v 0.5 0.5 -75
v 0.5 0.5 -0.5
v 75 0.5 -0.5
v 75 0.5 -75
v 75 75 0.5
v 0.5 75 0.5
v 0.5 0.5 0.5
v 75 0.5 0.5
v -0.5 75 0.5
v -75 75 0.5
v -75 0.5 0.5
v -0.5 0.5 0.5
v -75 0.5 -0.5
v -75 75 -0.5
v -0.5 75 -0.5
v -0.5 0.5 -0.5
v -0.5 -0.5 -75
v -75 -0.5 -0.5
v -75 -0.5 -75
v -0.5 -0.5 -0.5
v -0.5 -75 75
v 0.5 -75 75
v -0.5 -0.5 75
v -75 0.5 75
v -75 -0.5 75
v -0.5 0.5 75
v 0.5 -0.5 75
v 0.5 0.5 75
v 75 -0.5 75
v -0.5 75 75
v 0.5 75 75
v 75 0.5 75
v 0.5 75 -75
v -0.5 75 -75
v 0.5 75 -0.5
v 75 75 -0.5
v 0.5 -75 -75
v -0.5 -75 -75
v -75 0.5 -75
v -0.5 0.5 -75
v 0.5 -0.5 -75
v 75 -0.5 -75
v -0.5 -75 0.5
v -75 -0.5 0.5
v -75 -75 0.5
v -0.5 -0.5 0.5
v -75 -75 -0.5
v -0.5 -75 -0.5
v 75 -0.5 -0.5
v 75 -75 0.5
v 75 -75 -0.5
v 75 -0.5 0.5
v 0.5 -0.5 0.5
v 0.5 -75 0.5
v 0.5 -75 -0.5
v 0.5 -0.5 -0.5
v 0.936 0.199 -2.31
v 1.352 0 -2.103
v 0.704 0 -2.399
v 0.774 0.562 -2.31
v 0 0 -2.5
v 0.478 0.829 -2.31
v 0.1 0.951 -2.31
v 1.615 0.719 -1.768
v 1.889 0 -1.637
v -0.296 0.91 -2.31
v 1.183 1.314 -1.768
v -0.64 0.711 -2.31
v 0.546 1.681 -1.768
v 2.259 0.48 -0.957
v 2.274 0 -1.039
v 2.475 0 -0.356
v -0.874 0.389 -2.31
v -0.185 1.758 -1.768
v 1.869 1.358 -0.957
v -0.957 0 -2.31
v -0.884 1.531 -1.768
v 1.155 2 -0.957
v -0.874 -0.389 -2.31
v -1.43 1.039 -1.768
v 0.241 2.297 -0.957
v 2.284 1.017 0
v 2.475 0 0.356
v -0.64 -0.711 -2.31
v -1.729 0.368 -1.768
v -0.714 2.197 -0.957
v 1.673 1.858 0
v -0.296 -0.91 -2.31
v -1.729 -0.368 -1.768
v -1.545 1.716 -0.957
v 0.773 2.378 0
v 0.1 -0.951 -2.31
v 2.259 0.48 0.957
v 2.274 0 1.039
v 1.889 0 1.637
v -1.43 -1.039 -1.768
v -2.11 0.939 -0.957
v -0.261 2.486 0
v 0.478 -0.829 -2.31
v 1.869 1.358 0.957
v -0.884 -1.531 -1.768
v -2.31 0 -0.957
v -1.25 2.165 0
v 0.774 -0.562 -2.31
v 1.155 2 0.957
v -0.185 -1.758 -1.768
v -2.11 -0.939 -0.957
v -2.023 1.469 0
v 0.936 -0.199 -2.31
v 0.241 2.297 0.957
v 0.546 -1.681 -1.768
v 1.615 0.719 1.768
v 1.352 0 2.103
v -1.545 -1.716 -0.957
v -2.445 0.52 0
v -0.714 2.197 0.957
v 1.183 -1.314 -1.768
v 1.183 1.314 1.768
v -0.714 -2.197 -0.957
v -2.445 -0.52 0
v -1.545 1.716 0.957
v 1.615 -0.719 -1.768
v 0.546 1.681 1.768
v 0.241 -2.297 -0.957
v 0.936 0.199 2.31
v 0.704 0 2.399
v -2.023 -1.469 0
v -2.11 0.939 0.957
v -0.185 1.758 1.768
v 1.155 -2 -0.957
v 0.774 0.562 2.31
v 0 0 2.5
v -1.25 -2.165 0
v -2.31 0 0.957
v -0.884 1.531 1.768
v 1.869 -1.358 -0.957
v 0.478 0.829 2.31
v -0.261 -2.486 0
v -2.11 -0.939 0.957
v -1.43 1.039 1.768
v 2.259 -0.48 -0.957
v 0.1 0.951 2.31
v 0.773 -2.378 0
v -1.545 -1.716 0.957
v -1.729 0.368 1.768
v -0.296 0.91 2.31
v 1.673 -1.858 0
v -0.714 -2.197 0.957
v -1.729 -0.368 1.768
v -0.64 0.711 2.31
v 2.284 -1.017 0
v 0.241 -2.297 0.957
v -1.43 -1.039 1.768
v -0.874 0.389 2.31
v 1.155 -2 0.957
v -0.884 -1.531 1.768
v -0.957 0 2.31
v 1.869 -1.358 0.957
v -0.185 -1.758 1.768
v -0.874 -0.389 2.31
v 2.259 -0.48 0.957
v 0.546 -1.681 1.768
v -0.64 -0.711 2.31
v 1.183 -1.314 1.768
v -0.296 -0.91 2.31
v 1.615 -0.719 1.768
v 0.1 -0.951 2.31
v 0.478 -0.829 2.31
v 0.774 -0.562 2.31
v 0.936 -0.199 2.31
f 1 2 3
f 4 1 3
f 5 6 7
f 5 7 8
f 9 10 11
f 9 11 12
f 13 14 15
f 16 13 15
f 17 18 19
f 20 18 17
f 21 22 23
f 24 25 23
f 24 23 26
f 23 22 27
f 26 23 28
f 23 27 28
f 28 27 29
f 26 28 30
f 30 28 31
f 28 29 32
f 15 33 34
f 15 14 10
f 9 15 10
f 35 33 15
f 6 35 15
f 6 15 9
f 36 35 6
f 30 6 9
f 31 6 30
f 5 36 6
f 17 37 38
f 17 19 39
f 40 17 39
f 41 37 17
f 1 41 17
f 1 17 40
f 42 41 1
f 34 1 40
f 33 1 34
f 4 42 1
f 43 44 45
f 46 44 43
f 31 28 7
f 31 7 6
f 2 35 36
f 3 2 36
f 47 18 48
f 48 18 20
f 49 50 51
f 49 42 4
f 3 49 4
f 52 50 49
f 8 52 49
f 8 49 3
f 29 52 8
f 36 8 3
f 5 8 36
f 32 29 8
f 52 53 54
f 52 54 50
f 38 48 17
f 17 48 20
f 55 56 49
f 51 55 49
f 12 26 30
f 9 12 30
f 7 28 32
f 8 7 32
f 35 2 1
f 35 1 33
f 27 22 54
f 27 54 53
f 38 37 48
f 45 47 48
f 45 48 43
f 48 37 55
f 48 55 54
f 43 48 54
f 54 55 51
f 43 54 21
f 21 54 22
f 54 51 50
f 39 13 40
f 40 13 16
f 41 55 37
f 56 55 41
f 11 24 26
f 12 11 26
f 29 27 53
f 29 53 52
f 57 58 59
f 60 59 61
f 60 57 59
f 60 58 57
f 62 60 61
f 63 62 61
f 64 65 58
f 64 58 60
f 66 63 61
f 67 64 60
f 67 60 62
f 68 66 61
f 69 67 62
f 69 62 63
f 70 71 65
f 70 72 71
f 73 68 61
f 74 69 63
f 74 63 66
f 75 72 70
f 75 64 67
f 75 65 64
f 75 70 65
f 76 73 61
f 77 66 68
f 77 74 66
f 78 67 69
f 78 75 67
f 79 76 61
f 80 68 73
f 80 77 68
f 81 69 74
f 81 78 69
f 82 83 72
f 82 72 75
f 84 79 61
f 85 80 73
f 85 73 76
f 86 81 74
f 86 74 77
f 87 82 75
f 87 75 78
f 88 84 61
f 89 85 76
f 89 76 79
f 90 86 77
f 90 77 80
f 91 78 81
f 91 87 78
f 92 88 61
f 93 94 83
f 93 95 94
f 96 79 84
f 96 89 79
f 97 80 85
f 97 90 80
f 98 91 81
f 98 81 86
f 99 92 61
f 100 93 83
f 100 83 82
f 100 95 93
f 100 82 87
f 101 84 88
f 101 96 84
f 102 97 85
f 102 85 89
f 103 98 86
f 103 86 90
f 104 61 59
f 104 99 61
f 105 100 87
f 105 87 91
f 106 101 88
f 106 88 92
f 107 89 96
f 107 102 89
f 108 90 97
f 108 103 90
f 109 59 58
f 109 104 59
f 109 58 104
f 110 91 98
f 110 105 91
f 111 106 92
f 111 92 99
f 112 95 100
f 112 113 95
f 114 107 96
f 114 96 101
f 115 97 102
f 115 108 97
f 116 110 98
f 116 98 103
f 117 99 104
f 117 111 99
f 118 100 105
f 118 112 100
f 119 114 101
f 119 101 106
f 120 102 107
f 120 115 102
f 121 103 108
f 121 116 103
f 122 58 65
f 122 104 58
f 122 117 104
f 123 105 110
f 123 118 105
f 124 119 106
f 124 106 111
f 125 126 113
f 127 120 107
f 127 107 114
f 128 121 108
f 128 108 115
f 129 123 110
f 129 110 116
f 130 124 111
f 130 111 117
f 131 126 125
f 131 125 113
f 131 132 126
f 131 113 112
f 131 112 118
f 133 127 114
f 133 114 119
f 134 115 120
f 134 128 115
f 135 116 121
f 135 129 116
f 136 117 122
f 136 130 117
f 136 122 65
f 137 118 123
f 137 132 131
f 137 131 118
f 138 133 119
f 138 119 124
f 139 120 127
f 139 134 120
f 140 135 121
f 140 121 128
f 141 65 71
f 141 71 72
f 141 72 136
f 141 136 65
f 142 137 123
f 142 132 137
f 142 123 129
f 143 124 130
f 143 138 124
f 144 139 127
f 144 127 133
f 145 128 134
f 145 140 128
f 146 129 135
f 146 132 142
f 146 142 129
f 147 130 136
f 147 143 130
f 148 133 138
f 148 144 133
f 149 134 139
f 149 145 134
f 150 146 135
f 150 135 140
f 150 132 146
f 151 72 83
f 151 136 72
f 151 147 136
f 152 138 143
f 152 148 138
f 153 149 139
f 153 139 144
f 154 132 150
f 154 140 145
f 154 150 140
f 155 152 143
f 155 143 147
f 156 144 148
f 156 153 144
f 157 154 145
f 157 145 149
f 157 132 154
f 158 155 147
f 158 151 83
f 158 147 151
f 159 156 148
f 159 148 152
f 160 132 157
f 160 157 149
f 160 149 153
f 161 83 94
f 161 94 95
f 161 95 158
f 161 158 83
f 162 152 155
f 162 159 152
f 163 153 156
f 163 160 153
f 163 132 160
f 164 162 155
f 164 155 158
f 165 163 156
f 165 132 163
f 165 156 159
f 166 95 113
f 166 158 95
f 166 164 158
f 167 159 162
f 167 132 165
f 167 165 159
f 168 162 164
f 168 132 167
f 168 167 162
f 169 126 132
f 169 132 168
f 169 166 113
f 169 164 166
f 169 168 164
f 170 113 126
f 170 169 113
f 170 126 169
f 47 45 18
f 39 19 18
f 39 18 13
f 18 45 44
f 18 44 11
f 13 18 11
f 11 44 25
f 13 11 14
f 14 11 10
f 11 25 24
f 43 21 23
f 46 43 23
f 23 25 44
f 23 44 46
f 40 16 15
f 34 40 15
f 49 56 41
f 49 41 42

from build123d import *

# Parameters (mm, degrees)
F0_W     = 150
F0_H     = 150
F1_DEPTH = 0.5
F2_W     = 150
F2_H     = 150
F3_DEPTH = 0.5
F4_W     = 150
F4_H     = 150
F5_DEPTH = 0.5


with BuildPart() as f1:
    # F0 (on Front) → F1 (new body, symmetric)
    with BuildSketch(Plane.XZ):
        Rectangle(F0_W, F0_H)
    extrude(amount=F1_DEPTH, both=True)

    # F2 (on Top) → F3 (join, symmetric)
    with BuildSketch(Plane.XY):
        Rectangle(F2_W, F2_H)
    extrude(amount=F3_DEPTH, both=True)

    # F4 (on Right) → F5 (join, symmetric)
    with BuildSketch(Plane.YZ):
        Rectangle(F4_W, F4_H)
    extrude(amount=F5_DEPTH, both=True)


with BuildPart() as f7:
    # F6 (on Front) → F7 (revolve)
    with BuildSketch(Plane.XZ):
        with BuildLine():
            Line((0, 0), (0, -2.5))
            ThreePointArc((0, -2.5), (2.5, 0), (0, 2.5))
            Line((0, 2.5), (0, 0))
        make_face()
    revolve(axis=Axis((0, 0, 1.25), (0, 0, 1)))


solid = Compound([f1.part, f7.part])
